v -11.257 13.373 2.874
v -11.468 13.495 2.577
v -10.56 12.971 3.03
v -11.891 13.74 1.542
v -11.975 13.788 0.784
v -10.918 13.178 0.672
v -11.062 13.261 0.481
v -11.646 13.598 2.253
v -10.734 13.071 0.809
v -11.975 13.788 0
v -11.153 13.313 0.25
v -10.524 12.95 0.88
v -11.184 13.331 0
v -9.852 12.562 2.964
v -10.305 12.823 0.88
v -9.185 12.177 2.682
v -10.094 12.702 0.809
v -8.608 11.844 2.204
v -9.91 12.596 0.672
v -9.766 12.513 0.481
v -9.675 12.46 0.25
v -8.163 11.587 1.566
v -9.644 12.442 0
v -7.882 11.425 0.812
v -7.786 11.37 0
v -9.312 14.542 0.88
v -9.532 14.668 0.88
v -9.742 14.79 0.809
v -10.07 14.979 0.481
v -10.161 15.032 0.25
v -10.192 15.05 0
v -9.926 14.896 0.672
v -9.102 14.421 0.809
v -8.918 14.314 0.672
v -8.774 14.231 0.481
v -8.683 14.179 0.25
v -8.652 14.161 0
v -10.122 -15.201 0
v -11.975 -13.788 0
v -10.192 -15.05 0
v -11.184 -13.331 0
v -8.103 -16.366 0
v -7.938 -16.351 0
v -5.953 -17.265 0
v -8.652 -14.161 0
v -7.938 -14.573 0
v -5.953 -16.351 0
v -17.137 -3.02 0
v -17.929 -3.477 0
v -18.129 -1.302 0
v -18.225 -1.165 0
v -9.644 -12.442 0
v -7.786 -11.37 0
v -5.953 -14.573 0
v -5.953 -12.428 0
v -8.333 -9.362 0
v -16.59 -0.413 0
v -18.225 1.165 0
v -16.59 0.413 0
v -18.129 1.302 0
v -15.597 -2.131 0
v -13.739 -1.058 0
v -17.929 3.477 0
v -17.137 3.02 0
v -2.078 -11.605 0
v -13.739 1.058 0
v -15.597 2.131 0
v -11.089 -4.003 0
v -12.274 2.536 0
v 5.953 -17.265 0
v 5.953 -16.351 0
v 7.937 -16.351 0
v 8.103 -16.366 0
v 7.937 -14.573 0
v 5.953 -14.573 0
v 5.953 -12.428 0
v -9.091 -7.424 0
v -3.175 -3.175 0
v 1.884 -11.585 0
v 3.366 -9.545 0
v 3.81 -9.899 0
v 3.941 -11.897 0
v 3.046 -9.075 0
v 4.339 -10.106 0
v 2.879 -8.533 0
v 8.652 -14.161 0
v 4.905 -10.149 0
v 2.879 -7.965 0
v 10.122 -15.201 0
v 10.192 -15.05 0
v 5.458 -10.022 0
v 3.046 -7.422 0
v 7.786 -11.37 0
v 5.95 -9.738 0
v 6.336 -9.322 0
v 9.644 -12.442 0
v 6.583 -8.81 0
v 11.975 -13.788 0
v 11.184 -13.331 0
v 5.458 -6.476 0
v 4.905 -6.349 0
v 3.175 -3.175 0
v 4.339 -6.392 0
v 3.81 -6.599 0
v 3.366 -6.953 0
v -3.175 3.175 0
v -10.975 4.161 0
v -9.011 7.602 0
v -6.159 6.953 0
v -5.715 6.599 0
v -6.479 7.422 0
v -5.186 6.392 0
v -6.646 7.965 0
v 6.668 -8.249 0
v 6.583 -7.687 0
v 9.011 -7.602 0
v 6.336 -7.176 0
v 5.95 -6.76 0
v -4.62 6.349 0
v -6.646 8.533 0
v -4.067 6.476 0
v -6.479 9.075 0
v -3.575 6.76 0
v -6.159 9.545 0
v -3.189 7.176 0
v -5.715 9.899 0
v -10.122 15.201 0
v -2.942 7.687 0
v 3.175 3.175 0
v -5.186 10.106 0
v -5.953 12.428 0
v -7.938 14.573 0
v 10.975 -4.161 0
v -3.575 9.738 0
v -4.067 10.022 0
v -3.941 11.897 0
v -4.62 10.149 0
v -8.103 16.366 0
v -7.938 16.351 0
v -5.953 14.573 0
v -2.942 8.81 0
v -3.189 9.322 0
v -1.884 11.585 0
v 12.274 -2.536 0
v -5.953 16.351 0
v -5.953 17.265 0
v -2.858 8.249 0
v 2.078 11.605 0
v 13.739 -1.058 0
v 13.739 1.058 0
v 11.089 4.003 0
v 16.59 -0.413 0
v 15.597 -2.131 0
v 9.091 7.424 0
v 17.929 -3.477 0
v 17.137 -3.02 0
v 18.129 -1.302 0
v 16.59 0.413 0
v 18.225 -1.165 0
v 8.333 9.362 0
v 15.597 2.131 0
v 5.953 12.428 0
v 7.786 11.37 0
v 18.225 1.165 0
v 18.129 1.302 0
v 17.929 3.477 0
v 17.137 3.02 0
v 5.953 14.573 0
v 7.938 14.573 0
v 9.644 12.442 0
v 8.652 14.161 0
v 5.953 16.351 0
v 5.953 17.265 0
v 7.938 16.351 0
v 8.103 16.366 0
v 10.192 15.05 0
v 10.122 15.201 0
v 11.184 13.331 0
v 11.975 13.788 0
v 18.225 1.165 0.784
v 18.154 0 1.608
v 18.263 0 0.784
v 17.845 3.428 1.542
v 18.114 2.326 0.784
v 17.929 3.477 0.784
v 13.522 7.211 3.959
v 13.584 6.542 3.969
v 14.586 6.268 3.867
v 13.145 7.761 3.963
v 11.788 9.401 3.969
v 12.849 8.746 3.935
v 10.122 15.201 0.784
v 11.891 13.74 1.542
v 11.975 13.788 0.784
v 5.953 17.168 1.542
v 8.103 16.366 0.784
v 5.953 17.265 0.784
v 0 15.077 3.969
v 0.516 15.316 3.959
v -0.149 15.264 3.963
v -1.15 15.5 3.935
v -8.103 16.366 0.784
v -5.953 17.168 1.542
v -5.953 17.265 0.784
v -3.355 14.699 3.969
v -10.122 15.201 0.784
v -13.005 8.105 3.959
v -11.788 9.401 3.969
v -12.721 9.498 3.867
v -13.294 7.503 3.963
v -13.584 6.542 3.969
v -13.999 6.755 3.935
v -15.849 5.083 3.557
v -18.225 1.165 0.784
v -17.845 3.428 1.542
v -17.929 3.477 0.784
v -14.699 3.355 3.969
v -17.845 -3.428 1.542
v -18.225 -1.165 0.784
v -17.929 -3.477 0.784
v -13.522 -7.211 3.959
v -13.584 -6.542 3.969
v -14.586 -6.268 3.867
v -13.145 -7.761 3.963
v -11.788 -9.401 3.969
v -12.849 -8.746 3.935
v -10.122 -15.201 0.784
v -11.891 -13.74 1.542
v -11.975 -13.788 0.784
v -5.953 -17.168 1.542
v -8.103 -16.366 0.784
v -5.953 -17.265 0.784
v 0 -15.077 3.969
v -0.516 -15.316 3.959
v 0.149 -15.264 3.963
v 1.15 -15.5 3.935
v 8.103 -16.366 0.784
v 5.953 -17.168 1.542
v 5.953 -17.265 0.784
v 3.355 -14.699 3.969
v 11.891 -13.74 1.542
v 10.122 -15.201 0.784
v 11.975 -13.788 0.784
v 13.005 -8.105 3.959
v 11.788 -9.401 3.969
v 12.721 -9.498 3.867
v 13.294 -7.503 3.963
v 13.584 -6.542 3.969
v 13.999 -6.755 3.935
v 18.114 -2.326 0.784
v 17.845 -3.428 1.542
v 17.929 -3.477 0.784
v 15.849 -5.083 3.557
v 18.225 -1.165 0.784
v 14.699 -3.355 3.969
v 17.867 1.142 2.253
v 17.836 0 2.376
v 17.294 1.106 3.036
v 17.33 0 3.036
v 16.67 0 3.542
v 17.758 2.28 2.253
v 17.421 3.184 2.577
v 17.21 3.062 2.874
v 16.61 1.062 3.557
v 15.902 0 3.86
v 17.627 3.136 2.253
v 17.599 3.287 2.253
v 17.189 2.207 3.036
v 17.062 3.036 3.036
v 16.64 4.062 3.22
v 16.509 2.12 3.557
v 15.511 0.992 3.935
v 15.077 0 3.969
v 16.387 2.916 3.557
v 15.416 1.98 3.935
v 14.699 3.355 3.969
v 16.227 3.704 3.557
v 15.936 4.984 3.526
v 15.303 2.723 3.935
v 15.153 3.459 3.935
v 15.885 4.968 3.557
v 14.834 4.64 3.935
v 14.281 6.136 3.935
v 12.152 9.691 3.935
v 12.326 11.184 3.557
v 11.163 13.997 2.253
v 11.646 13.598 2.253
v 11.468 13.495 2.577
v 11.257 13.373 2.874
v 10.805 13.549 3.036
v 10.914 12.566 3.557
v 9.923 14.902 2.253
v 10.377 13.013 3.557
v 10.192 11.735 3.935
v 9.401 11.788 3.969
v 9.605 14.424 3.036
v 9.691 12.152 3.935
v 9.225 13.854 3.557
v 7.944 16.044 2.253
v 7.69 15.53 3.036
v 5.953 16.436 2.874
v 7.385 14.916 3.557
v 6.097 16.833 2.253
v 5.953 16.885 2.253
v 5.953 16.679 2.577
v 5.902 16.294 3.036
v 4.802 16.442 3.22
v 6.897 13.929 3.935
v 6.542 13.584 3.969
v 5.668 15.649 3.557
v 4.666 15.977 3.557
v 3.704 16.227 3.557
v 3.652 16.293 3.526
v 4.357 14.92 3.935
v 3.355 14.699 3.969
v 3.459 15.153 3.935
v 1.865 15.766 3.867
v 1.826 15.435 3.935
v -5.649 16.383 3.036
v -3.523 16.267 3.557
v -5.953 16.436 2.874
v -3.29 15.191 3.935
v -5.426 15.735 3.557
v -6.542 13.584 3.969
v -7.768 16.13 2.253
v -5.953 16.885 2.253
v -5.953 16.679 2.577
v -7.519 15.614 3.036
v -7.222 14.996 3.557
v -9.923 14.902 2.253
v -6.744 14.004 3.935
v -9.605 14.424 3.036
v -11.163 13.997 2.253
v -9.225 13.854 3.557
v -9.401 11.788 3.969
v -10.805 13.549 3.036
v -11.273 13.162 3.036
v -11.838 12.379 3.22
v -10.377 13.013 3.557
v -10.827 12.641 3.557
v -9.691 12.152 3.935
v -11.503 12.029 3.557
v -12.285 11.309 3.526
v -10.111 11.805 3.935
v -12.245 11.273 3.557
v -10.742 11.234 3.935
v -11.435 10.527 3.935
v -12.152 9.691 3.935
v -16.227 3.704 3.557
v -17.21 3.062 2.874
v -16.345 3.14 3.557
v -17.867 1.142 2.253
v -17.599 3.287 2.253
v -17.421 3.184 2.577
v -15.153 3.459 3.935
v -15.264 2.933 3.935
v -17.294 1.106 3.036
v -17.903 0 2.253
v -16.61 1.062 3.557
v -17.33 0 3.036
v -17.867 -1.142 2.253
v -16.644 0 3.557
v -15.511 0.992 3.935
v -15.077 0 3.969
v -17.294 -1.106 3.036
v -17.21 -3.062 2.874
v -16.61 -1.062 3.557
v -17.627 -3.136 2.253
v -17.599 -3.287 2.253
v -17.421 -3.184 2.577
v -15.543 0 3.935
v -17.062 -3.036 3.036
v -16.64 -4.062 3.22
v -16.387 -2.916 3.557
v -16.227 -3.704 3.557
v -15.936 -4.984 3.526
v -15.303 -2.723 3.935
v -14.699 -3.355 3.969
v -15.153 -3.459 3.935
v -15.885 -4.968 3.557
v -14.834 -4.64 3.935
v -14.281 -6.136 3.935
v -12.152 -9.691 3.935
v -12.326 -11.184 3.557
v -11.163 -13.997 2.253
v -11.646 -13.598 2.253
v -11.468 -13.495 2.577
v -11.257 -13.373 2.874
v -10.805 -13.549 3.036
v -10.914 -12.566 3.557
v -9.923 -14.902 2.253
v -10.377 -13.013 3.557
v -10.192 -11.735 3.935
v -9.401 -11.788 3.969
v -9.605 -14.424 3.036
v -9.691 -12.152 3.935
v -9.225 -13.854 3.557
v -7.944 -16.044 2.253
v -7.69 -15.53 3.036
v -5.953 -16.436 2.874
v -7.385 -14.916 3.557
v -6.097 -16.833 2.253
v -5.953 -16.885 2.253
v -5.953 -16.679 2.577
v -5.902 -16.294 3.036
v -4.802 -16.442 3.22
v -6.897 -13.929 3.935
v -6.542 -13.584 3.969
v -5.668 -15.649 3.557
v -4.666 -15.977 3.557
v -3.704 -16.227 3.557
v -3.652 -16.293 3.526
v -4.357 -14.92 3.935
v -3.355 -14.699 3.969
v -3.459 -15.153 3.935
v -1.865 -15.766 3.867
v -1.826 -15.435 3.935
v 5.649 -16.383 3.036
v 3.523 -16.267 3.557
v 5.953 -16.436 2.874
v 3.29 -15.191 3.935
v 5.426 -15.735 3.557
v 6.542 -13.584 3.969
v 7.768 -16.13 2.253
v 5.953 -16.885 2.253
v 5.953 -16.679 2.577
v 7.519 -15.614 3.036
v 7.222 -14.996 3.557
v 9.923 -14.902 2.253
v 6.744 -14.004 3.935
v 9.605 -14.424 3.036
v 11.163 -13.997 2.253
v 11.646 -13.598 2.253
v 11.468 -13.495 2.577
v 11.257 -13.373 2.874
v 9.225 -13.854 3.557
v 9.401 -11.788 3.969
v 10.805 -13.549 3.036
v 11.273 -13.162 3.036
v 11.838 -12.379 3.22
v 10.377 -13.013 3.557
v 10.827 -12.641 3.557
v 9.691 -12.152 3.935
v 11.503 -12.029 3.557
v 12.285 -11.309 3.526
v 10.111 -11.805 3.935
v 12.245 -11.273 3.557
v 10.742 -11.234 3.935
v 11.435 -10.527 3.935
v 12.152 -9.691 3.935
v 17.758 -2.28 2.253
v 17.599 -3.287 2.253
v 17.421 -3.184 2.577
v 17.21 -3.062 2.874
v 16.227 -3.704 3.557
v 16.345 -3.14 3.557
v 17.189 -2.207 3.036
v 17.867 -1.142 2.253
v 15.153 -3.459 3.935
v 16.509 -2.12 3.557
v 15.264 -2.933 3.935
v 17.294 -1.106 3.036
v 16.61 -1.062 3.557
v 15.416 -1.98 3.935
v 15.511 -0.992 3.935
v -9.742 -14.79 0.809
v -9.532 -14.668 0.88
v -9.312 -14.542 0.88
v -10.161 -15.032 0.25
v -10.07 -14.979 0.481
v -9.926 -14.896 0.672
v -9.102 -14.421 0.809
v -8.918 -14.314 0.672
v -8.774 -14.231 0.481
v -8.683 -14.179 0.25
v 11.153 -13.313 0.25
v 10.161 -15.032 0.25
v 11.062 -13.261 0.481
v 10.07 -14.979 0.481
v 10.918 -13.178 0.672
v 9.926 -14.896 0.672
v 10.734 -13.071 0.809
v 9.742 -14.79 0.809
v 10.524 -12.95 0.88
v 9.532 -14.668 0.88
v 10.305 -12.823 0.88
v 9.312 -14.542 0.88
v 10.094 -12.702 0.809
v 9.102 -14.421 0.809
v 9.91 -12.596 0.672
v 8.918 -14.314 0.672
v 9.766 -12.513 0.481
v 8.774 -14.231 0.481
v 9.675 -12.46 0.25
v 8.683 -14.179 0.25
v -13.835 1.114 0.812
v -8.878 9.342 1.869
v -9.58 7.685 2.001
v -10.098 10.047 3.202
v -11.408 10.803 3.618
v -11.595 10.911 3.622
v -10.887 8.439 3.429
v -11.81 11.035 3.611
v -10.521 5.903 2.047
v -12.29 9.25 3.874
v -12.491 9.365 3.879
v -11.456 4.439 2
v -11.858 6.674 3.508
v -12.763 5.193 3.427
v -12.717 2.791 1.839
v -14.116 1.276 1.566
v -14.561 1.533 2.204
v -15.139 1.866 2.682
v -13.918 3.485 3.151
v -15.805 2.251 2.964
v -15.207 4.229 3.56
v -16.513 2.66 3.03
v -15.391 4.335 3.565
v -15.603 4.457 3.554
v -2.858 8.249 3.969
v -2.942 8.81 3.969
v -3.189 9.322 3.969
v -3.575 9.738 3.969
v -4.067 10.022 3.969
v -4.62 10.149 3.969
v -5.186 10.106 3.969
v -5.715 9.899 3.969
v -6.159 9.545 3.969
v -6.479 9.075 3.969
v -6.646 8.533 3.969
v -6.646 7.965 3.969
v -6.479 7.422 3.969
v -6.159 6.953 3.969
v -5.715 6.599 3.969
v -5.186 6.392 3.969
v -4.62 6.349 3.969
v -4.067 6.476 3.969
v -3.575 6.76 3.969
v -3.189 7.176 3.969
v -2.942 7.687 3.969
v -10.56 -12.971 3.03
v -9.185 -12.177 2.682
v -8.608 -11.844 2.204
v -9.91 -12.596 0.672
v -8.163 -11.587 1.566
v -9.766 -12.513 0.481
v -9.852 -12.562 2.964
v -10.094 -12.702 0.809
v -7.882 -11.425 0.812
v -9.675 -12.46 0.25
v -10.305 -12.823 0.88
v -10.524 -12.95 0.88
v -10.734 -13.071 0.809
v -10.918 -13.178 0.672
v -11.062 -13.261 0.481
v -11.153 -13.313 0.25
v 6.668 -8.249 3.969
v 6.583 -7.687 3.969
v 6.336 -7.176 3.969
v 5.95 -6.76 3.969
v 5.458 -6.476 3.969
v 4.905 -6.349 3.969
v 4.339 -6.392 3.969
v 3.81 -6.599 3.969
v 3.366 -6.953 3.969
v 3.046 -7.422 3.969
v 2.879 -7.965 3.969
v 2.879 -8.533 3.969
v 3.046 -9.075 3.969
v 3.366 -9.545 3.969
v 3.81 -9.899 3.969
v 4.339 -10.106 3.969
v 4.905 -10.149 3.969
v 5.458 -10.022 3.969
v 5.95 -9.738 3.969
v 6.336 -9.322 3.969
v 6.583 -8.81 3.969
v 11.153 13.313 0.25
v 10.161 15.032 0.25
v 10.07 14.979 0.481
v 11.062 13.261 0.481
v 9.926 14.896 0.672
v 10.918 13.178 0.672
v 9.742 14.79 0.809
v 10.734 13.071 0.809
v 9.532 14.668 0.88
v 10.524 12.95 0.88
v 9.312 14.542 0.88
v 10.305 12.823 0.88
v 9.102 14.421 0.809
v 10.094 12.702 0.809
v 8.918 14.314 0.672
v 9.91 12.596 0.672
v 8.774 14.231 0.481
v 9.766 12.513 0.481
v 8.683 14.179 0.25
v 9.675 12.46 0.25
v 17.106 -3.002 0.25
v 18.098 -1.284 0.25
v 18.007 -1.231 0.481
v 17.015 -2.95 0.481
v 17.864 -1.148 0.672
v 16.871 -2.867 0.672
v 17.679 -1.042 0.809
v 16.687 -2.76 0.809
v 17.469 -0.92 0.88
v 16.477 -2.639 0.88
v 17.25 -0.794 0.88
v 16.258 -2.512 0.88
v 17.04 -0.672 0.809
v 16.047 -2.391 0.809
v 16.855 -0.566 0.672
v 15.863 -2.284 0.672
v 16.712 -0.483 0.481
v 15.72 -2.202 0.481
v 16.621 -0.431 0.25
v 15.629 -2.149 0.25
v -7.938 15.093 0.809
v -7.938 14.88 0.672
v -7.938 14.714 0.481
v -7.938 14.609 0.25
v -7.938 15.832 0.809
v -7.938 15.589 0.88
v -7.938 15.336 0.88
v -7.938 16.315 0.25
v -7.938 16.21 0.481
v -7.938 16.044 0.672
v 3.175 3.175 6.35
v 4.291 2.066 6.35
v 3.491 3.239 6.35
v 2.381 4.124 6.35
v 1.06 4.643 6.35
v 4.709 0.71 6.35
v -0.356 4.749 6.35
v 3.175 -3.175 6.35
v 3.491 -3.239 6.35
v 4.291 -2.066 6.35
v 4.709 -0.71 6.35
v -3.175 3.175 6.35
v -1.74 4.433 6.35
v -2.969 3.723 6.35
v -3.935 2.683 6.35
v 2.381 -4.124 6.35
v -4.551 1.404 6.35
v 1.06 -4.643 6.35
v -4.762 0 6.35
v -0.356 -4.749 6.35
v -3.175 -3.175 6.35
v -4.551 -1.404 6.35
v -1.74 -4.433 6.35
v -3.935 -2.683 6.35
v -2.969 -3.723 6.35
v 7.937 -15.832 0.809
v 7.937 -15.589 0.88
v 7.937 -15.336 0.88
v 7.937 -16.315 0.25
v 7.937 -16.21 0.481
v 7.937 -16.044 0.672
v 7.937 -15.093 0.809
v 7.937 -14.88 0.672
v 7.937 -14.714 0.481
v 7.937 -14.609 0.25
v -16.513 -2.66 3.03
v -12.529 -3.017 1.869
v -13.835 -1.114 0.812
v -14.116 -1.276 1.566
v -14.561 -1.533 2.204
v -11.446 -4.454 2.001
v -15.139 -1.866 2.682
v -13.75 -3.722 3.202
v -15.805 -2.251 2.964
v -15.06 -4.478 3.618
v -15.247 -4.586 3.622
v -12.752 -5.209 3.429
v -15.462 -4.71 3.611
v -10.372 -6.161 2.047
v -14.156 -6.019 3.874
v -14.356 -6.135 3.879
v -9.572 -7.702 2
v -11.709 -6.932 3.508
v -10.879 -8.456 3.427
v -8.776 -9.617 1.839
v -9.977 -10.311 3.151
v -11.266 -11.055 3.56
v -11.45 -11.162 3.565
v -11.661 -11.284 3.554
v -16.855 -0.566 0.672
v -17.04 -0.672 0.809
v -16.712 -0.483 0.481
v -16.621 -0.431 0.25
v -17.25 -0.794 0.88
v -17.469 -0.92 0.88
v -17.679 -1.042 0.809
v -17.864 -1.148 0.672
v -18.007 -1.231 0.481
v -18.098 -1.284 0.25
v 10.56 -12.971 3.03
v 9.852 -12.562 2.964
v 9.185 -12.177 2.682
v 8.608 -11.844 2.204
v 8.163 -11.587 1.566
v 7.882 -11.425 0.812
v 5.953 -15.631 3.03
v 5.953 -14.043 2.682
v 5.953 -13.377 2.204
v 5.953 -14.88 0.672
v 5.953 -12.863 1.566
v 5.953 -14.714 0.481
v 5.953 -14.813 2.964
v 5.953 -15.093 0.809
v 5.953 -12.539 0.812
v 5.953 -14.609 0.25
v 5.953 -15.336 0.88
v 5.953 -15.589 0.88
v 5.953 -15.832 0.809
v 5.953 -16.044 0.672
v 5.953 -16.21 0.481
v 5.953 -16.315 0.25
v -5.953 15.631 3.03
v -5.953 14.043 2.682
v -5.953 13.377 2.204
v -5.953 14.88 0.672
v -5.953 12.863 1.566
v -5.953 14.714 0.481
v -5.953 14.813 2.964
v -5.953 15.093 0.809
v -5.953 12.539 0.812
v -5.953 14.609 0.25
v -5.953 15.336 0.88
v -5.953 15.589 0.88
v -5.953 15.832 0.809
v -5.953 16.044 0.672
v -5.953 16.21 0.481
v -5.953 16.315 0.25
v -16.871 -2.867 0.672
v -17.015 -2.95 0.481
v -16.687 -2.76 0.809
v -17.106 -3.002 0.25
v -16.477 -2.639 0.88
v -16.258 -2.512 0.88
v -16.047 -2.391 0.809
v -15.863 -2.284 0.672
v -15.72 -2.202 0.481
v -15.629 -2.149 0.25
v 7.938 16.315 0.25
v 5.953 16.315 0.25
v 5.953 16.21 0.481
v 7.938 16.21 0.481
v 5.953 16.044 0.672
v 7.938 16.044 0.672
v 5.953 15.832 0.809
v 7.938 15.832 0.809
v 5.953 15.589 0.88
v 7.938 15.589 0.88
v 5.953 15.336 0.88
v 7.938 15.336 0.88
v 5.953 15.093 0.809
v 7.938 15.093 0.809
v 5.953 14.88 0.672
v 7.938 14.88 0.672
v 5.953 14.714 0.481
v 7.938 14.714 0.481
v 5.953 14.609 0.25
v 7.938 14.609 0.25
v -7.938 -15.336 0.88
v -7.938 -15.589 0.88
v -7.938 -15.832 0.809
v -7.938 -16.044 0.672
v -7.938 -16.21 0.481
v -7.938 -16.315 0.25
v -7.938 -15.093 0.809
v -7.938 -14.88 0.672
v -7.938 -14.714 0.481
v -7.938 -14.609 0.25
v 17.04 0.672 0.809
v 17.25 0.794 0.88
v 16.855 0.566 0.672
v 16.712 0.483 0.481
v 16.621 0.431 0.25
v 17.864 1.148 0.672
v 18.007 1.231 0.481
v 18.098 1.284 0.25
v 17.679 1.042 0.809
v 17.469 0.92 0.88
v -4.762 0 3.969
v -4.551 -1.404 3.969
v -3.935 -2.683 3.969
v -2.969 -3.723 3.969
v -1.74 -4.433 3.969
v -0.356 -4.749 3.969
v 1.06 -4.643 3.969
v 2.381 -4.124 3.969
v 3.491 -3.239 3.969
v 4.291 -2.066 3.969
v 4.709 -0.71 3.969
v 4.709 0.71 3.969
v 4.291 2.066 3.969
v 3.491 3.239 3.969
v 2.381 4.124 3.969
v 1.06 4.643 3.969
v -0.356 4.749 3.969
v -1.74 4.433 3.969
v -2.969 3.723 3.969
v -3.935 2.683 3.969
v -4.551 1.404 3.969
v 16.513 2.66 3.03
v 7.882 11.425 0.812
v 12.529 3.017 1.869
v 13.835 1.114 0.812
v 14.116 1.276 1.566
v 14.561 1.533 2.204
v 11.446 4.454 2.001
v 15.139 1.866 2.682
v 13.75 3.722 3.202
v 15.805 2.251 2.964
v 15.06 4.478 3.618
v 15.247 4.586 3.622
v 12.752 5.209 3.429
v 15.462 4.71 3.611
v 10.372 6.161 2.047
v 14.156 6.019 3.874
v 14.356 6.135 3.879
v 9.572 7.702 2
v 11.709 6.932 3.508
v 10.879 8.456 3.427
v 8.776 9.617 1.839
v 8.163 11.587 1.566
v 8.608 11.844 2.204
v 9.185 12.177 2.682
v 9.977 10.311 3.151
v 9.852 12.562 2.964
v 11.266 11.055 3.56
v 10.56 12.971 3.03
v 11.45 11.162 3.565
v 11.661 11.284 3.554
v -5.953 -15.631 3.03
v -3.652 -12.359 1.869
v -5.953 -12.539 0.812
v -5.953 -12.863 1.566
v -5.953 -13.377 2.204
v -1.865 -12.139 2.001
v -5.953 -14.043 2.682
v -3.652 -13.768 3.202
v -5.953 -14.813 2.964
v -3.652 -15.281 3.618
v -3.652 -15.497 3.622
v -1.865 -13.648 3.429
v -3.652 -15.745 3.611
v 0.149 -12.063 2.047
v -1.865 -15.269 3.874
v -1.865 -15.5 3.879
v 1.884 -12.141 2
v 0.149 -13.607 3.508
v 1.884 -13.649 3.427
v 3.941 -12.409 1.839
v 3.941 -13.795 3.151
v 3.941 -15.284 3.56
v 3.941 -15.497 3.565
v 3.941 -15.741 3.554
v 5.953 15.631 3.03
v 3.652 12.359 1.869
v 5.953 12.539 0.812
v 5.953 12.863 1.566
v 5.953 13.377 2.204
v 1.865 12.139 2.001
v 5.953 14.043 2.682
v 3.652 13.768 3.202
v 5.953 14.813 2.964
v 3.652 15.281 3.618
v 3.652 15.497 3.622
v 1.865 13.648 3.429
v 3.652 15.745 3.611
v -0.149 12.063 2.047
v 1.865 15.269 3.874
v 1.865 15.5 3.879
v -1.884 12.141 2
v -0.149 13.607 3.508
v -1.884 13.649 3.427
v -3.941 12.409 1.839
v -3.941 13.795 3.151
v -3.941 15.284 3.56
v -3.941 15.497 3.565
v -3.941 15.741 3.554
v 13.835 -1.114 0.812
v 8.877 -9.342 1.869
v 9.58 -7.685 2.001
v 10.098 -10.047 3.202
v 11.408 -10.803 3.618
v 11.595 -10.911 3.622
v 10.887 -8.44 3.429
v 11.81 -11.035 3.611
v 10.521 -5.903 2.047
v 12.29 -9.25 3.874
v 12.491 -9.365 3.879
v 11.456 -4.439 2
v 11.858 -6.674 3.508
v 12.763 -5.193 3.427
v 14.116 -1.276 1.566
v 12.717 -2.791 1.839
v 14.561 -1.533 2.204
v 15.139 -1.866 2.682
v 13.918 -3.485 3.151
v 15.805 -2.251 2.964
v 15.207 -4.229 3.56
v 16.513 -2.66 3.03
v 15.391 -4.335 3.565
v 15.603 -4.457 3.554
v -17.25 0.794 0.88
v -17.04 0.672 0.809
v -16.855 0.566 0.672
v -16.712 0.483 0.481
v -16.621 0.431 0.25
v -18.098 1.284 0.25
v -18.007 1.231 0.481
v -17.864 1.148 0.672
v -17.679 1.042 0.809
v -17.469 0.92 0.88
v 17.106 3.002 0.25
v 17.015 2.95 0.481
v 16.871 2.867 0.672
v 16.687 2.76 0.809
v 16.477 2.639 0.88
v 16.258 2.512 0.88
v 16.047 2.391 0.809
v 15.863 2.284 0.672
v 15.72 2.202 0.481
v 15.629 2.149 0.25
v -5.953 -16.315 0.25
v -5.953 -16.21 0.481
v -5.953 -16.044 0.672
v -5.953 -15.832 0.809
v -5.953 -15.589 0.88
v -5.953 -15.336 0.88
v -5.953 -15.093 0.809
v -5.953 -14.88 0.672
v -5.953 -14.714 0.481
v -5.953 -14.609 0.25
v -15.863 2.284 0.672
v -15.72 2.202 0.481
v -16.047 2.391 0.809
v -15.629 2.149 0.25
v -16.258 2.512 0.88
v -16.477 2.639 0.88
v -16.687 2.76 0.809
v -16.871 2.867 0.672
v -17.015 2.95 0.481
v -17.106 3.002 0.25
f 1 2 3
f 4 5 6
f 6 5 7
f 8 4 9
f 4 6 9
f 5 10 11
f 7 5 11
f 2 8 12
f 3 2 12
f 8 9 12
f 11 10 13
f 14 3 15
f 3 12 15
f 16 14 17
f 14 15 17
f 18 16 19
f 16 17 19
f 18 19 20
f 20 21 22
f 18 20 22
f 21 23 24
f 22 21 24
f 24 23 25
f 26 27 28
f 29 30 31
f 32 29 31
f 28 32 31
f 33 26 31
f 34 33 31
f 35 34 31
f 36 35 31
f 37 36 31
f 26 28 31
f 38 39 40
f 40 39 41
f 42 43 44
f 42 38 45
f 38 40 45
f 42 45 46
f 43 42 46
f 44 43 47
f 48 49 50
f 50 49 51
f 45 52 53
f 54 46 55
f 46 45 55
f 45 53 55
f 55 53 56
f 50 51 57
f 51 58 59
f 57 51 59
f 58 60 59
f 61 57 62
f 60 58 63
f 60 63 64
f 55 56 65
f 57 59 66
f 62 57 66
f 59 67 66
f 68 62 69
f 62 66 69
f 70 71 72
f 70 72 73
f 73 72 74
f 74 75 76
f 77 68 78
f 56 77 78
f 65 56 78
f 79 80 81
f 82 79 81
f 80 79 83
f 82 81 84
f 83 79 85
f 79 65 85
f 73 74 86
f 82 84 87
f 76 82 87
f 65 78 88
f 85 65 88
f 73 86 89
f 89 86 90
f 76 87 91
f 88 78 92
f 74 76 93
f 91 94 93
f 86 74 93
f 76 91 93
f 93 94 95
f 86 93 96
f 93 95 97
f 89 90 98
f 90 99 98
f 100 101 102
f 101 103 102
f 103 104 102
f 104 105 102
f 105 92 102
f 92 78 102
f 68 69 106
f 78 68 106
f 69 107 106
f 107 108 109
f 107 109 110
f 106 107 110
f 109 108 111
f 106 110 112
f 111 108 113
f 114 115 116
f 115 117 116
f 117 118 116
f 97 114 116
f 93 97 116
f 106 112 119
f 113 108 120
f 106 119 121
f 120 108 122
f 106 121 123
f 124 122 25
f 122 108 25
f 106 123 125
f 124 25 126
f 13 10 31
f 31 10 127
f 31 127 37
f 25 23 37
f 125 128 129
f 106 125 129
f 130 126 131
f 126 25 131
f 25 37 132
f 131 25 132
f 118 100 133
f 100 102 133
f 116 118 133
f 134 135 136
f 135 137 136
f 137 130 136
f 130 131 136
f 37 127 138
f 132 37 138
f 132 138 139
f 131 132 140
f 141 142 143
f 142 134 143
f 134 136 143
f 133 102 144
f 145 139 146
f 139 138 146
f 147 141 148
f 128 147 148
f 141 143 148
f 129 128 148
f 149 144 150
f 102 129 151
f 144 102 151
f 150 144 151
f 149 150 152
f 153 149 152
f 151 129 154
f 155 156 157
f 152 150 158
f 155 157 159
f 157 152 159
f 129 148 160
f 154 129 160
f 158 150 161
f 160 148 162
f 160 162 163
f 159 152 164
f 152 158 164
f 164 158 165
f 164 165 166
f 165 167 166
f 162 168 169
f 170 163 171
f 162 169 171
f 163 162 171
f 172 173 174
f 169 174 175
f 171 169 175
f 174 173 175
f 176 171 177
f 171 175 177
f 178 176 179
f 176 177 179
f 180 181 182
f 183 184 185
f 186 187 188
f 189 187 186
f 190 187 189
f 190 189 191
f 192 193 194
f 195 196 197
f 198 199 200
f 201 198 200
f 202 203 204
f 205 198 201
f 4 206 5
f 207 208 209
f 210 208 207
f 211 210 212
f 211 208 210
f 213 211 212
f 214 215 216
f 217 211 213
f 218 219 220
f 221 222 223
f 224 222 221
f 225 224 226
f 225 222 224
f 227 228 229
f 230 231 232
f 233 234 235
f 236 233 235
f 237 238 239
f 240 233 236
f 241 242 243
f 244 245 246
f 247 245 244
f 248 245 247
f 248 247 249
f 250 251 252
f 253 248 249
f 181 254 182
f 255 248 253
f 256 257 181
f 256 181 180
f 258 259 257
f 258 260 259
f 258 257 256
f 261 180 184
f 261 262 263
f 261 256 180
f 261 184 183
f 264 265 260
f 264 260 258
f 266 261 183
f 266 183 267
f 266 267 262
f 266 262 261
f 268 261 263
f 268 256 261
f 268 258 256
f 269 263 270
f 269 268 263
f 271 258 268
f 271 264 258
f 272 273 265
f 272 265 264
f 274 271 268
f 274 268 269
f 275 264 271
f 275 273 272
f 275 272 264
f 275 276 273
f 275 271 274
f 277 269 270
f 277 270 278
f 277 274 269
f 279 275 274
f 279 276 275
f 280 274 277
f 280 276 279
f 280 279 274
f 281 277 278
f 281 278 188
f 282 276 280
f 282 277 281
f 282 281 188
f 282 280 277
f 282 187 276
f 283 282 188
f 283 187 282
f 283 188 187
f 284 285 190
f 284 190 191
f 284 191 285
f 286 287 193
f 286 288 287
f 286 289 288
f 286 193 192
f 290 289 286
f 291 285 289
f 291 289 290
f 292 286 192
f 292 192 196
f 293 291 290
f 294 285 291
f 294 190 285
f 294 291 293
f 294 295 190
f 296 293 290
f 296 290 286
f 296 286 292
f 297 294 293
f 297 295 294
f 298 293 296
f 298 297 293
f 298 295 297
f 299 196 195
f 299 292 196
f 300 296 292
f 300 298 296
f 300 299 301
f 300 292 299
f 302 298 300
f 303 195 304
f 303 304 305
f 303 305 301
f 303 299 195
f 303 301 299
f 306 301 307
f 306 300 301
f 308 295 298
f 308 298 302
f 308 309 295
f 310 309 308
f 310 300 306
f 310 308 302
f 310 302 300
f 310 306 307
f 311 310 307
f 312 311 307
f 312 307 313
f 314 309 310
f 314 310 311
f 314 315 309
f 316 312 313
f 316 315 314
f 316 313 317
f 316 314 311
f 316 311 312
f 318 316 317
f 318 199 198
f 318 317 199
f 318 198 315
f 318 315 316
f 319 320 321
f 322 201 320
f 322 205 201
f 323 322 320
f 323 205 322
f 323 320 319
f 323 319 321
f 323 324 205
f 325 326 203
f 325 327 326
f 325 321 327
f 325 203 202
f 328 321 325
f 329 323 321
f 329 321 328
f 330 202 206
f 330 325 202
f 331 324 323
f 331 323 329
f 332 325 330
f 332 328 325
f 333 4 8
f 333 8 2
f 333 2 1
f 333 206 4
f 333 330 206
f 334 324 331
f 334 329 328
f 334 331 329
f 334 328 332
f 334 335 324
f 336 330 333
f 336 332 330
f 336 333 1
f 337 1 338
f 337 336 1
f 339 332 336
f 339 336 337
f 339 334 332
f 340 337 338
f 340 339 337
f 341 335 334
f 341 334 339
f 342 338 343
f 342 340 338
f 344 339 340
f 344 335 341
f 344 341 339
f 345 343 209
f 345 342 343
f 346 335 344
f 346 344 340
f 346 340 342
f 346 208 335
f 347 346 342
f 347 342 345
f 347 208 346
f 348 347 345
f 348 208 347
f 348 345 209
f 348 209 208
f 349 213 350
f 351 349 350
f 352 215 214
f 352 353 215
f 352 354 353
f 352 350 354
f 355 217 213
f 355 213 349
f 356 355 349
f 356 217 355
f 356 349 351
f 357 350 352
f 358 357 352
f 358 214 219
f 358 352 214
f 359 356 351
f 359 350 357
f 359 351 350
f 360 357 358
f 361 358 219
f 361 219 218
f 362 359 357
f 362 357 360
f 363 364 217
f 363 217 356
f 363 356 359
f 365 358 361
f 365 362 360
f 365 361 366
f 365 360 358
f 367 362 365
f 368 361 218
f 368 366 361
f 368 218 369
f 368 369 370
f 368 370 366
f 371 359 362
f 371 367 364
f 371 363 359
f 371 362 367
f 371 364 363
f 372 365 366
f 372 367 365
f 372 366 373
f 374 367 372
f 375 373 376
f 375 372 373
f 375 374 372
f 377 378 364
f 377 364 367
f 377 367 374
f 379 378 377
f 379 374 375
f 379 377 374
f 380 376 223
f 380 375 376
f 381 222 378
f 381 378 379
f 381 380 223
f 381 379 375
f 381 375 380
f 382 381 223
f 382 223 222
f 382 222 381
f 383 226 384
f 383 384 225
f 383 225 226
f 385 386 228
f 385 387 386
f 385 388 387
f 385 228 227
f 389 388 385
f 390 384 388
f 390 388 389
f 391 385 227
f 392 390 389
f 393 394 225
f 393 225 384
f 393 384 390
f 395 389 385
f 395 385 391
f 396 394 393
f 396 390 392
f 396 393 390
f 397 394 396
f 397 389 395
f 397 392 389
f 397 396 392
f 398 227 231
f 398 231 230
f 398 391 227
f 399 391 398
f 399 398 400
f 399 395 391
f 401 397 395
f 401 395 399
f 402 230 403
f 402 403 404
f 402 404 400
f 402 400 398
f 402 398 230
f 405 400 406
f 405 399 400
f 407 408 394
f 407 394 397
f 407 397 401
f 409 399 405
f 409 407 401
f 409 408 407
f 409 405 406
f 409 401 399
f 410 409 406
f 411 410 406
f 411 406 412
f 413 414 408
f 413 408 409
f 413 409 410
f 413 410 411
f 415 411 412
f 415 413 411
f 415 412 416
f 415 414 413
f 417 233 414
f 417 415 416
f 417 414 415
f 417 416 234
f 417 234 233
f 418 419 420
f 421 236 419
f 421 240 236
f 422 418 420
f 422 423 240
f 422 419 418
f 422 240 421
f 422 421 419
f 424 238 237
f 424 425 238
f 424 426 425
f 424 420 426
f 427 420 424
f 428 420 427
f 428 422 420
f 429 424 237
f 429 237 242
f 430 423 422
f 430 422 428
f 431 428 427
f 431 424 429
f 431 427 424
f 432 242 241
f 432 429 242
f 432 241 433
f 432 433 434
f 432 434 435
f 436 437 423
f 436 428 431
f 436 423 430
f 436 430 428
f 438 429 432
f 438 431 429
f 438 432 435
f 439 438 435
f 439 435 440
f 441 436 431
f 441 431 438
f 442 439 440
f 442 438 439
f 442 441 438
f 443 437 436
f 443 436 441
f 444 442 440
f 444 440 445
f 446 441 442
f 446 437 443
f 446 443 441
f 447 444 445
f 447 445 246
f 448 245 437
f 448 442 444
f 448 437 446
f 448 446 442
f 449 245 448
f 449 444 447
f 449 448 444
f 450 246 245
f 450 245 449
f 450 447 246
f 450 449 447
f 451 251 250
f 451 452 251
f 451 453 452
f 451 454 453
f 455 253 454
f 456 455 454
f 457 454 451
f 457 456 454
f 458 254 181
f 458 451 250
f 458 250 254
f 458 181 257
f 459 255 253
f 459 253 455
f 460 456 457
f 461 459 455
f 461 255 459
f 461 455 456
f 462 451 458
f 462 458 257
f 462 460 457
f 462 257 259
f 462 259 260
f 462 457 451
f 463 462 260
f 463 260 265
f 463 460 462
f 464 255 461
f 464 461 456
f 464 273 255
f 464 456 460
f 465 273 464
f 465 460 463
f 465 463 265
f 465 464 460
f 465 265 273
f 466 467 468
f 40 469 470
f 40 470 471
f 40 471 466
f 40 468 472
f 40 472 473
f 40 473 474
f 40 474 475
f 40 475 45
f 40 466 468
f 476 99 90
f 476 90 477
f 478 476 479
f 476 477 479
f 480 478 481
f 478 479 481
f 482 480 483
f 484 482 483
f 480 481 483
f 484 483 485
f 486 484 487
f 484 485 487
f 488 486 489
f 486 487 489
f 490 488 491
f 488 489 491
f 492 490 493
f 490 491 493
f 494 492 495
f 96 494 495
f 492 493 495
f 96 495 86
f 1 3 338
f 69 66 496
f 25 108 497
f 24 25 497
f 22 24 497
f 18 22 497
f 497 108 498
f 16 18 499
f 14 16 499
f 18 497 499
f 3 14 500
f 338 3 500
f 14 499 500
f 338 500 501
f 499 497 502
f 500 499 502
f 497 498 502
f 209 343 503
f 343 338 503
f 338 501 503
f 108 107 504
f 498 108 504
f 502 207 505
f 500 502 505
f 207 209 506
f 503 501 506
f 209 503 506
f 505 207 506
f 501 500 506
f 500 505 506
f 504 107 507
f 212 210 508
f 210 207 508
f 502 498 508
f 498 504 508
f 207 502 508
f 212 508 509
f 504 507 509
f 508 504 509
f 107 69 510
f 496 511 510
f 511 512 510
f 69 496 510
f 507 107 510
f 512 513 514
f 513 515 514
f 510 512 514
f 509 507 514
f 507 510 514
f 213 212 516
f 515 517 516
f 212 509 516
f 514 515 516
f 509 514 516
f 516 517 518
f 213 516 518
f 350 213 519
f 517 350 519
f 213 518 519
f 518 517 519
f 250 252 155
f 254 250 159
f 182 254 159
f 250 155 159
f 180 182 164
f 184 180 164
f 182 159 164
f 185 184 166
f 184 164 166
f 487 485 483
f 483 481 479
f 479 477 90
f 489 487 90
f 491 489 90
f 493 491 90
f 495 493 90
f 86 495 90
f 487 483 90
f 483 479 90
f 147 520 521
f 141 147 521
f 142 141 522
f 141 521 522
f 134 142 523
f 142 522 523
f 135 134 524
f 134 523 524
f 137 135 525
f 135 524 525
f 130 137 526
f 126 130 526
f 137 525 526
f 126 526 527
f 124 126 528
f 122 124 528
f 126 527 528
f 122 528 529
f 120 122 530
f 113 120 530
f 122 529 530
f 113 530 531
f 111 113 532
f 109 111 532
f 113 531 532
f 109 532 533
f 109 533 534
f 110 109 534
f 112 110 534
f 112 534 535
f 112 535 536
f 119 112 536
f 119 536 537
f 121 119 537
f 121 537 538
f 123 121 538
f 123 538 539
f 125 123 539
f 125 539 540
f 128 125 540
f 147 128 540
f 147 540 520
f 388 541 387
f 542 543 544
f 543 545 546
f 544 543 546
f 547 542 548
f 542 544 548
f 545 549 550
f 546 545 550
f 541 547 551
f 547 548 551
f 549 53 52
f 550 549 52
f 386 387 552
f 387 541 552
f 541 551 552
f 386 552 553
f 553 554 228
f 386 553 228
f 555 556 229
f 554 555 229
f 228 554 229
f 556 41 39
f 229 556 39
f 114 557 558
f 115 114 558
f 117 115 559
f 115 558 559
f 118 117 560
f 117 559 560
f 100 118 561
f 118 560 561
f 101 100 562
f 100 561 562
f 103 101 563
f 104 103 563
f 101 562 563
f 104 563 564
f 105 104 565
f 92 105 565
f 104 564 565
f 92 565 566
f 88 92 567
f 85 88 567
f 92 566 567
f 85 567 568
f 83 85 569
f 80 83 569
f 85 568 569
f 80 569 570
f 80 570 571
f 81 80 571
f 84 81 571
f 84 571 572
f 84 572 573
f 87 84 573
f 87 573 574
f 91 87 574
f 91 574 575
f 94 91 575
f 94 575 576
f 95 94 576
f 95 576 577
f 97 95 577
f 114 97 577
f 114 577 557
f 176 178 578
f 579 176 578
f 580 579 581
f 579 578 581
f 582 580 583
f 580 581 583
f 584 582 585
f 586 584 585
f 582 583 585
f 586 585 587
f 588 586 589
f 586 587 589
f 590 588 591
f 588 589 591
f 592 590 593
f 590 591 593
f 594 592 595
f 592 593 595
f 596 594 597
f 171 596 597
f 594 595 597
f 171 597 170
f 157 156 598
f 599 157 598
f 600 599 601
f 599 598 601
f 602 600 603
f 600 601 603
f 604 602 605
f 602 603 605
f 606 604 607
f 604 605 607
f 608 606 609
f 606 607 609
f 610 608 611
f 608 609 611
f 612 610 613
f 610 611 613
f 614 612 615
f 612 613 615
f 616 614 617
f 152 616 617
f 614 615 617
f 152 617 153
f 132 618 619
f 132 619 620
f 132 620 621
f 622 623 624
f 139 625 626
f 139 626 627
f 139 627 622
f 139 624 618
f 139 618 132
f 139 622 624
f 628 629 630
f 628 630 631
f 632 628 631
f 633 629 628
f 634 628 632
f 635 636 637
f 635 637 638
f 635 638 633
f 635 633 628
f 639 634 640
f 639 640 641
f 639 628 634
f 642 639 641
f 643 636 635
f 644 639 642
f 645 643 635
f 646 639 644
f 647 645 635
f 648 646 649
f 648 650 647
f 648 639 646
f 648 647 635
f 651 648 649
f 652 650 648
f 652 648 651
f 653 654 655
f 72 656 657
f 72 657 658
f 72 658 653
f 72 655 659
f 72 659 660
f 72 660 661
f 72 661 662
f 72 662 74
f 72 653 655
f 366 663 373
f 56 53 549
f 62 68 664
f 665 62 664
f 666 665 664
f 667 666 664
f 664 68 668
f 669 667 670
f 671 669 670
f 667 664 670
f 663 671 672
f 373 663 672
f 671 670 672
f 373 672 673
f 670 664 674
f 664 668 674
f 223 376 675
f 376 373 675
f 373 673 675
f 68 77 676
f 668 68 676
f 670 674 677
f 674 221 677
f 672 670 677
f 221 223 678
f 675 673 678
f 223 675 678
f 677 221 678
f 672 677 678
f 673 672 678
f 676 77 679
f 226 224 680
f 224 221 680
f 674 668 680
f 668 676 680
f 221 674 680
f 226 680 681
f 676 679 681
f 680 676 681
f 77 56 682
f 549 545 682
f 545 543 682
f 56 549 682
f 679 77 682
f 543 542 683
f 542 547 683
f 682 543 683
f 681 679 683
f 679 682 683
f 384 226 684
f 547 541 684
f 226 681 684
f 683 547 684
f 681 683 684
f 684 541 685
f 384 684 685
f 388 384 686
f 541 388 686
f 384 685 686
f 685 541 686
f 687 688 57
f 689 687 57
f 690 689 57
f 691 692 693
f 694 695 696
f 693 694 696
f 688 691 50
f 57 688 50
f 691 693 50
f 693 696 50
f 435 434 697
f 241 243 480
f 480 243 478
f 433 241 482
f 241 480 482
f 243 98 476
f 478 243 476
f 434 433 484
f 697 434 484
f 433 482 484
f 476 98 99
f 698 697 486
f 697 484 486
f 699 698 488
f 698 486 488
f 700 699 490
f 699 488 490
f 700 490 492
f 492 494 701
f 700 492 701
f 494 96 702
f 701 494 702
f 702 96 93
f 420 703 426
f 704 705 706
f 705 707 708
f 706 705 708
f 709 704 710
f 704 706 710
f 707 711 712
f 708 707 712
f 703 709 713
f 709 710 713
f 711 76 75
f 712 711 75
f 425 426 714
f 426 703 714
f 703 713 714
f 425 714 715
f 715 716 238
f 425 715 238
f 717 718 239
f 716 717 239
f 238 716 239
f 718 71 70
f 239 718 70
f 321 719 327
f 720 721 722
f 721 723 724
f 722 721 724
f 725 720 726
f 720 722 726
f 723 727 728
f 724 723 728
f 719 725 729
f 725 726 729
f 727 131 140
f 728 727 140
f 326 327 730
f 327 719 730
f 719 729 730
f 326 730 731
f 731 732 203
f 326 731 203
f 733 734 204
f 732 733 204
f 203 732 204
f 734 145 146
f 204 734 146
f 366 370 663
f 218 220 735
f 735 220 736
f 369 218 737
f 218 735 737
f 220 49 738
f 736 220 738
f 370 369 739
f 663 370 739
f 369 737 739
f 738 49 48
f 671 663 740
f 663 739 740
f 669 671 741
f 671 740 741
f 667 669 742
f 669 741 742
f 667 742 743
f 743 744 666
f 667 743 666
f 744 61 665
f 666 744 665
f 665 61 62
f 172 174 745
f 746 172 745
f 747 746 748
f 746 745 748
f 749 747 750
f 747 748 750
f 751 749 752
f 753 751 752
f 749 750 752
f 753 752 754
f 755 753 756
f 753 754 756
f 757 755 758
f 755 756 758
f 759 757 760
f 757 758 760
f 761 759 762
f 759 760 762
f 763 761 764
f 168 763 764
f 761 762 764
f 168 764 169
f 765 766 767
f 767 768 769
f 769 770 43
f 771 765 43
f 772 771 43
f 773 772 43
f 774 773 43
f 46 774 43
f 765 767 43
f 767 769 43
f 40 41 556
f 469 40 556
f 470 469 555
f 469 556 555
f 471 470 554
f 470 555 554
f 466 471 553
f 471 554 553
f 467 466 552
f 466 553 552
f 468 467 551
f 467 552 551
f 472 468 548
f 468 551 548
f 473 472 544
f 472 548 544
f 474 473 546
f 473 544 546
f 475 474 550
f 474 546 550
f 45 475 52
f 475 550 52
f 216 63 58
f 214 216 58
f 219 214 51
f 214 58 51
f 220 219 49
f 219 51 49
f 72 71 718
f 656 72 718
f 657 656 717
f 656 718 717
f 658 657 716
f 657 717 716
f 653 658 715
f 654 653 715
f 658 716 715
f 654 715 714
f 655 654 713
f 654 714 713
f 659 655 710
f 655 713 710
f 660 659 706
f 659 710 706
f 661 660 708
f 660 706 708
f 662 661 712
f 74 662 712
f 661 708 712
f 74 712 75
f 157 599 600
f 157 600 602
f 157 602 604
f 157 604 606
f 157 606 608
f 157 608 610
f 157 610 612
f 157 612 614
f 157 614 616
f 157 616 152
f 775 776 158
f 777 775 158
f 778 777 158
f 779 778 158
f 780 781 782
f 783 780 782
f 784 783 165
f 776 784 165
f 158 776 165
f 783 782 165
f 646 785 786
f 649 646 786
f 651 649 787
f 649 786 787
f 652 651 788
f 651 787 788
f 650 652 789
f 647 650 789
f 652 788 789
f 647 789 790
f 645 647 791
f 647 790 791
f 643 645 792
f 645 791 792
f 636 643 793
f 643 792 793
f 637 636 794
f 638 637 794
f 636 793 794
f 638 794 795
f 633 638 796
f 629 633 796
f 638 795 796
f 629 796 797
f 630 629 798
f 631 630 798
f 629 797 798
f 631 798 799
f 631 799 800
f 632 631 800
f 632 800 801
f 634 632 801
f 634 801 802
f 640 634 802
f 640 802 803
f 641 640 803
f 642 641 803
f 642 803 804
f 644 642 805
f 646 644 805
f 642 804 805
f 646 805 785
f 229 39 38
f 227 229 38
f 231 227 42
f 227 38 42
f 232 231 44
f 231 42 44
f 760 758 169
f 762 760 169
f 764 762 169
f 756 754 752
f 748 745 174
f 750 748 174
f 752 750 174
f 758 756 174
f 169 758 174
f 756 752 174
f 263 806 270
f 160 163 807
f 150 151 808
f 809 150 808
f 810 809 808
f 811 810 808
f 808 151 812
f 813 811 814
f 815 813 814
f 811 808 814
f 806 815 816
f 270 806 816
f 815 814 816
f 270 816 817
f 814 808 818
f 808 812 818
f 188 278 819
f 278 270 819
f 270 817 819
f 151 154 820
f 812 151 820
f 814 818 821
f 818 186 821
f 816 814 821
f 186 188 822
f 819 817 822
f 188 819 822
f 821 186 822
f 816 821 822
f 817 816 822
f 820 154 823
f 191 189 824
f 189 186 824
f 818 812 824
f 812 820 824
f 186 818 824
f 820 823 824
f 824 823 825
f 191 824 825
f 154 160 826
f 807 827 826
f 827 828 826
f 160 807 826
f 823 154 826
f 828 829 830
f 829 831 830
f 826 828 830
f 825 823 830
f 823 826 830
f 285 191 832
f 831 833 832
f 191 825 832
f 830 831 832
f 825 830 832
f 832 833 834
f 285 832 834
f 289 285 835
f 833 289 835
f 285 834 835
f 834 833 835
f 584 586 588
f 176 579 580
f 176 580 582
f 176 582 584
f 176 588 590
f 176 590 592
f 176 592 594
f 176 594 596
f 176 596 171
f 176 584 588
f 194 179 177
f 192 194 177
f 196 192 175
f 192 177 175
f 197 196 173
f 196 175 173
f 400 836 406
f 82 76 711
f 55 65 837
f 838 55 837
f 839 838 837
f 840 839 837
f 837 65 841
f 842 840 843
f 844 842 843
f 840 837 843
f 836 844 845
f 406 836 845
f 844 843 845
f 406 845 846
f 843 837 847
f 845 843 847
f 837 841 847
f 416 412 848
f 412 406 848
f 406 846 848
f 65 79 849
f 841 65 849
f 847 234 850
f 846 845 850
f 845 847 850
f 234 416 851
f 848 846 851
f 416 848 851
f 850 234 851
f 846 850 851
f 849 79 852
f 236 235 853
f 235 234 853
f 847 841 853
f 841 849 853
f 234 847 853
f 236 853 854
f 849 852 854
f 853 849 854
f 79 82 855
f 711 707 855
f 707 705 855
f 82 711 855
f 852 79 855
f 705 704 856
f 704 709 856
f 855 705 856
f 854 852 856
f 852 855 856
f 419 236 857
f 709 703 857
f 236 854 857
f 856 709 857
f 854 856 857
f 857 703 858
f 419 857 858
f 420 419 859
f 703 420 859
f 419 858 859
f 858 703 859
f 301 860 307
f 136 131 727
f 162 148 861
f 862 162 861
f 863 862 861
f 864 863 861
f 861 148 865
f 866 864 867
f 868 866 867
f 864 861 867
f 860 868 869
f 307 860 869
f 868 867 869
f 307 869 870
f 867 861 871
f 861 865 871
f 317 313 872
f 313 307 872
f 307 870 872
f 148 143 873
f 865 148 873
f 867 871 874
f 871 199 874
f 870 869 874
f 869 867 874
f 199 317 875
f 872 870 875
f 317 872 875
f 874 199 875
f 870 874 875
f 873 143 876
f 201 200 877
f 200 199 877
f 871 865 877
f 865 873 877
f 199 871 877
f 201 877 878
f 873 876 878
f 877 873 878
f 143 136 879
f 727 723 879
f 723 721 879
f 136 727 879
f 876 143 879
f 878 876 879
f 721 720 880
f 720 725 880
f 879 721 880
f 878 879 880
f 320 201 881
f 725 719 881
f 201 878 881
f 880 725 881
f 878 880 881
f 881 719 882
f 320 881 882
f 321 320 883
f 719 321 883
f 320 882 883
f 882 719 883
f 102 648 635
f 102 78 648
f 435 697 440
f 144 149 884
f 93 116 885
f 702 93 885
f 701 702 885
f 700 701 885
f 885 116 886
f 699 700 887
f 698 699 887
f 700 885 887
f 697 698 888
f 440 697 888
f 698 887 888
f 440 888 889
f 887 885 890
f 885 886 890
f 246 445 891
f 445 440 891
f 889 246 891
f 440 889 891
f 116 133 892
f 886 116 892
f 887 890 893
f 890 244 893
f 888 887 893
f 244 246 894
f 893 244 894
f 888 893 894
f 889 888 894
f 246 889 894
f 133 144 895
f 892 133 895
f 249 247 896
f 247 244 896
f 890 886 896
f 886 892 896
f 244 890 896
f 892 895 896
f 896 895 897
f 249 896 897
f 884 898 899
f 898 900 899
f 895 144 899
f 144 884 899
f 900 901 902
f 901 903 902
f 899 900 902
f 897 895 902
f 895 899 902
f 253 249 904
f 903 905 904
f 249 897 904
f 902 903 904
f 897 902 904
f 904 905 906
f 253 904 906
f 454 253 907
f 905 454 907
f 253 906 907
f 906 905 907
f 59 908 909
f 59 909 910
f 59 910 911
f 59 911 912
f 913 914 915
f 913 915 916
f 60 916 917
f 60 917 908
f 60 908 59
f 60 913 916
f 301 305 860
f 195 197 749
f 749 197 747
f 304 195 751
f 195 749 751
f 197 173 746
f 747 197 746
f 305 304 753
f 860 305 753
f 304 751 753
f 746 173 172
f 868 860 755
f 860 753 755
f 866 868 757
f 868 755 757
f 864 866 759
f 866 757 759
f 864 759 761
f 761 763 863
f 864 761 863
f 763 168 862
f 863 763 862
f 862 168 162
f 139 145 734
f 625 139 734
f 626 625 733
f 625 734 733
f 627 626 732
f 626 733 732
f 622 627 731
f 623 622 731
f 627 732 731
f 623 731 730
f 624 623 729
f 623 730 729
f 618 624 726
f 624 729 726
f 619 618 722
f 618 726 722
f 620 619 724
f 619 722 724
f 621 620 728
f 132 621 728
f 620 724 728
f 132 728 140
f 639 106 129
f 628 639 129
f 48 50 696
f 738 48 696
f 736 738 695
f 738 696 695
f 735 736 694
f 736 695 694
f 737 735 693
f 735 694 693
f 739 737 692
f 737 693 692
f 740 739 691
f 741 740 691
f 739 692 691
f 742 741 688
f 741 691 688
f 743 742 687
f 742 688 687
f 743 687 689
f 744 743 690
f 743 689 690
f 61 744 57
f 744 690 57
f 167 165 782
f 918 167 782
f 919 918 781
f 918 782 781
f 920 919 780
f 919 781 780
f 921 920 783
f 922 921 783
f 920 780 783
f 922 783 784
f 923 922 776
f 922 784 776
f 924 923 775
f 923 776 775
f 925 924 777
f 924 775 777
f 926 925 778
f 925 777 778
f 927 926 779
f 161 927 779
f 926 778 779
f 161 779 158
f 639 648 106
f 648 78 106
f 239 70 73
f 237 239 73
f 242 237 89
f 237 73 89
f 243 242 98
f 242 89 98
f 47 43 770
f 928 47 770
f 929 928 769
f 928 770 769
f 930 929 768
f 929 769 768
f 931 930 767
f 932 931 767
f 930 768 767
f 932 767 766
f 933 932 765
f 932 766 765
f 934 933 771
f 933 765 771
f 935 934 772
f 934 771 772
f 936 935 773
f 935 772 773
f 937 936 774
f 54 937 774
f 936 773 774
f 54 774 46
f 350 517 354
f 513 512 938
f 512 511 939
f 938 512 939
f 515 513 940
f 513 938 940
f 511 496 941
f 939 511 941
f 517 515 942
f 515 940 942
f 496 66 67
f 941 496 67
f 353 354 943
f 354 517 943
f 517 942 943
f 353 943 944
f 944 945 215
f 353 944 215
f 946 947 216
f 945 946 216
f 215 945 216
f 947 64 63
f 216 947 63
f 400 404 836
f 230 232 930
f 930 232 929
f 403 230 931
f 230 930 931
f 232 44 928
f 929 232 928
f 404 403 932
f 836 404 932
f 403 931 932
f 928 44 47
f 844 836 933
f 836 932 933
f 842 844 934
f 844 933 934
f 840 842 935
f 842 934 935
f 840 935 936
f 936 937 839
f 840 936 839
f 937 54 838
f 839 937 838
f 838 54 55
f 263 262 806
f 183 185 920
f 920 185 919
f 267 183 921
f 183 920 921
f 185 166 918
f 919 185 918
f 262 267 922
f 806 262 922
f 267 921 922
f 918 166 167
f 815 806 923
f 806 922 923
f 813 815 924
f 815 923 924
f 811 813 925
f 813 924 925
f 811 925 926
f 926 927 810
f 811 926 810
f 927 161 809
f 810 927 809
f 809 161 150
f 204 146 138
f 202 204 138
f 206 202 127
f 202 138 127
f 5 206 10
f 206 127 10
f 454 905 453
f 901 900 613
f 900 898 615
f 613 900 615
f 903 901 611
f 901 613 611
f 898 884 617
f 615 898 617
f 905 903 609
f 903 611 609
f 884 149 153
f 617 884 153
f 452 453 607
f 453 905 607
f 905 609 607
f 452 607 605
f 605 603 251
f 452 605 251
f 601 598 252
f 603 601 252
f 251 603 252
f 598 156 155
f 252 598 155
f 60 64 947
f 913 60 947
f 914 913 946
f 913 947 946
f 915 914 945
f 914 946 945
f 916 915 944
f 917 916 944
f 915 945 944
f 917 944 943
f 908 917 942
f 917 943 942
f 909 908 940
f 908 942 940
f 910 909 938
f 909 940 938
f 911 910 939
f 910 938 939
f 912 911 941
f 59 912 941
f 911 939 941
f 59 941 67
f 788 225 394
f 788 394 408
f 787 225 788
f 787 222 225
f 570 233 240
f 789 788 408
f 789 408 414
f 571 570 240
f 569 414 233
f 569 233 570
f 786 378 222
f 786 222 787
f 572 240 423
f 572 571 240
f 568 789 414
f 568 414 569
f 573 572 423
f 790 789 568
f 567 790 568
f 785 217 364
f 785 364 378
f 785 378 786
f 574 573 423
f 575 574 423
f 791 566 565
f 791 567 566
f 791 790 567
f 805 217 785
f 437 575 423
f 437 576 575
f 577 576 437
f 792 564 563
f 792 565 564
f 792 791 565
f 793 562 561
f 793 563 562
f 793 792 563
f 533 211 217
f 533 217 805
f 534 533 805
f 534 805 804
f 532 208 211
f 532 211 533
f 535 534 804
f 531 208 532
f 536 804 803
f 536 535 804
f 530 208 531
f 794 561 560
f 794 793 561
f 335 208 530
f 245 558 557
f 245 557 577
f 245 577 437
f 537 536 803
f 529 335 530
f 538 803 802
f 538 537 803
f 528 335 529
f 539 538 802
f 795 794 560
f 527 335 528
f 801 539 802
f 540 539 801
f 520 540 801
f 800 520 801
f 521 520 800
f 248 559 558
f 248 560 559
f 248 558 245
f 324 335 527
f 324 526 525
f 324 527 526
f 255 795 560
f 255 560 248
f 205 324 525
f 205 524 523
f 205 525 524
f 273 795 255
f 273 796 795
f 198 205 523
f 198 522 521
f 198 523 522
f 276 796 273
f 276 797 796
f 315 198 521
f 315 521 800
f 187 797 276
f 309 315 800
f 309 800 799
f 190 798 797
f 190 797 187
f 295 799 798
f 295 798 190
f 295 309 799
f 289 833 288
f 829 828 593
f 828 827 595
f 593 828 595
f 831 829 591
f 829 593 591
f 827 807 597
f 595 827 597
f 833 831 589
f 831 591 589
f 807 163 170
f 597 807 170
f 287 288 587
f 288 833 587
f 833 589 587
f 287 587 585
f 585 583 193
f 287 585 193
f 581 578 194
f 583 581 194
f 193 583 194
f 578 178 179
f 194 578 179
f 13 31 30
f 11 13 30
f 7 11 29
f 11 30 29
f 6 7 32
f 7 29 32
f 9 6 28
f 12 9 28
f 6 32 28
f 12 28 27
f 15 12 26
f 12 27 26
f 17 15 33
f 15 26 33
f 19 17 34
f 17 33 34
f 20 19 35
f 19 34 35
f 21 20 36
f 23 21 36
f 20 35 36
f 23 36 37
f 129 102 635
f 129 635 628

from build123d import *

# Parameters (mm, degrees)
SKETCH1_R           = 18.2626
BOSS_EXTRUDE1_DEPTH = 3.96875
FILLET1_R           = 3.18516
SKETCH2_R           = 1.905
SKETCH2_W           = 6.35
SKETCH2_H           = 6.35
CUT_EXTRUDE1_DEPTH  = 27.130367418
SKETCH6_R           = 0.889
CUT_EXTRUDE2_DEPTH  = 7.9375
CIRPATTERN1_COUNT   = 6
SKETCH7_R           = 4.7625
SKETCH7_W           = 6.35
SKETCH7_H           = 6.35
BOSS_EXTRUDE2_DEPTH = 2.38125


with BuildPart() as part:
    # Sketch1 → Boss-Extrude1 (new body)
    with BuildSketch(Plane.XY):
        Circle(SKETCH1_R)
    extrude(amount=BOSS_EXTRUDE1_DEPTH)

    # Fillet1
    fillet1_edges = [part.edges().sort_by_distance(p)[0] for p in [
        (-18.2626, 0, 3.96875),
    ]]
    fillet(fillet1_edges, radius=FILLET1_R)

    # Sketch2 → Cut-Extrude1 (cut, through all)
    with BuildSketch(Plane.XY.offset(3.96875)):
        with Locations((-4.7625, 8.248891971)):
            Circle(SKETCH2_R)
        with Locations((4.7625, -8.248891971)):
            Circle(SKETCH2_R)
        Rectangle(SKETCH2_W, SKETCH2_H)
    extrude(amount=-CUT_EXTRUDE1_DEPTH, mode=Mode.SUBTRACT)

    # Sketch5 → Cut-Revolve1 (revolve, cut)
    with BuildSketch(Plane.XY):
        with BuildLine():
            Line((-5.953125, 15.46225), (5.953125, 15.46225))
            Line((5.953125, 15.46225), (5.953125, 18.496596004))
            ThreePointArc((5.953125, 18.496596004), (0, 19.431), (-5.953125, 18.496596004))
            Line((-5.953125, 18.496596004), (-5.953125, 15.46225))
        make_face()
    cut_revolve1 = revolve(axis=Axis((-5.953125, 15.46225, 0), (-1, 0, 0)), mode=Mode.SUBTRACT)

    # Sketch6 → Cut-Extrude2 (cut, symmetric)
    with BuildSketch(Plane(origin=(0, 0, 0), x_dir=(0, 0, -1), z_dir=(1, 0, 0))):
        with Locations((0, 15.46225)):
            Circle(SKETCH6_R)
    cut_extrude2 = extrude(amount=CUT_EXTRUDE2_DEPTH, both=True, mode=Mode.SUBTRACT)

    # CirPattern1: Cut-Revolve1, Cut-Extrude2 ×6 about axis
    cirpattern1_axis = Axis((0, 0, 0), (0, 0, 1))
    add([cut_revolve1.rotate(cirpattern1_axis, i * 360 / CIRPATTERN1_COUNT) for i in range(1, CIRPATTERN1_COUNT)], mode=Mode.SUBTRACT)
    add([cut_extrude2.rotate(cirpattern1_axis, i * 360 / CIRPATTERN1_COUNT) for i in range(1, CIRPATTERN1_COUNT)], mode=Mode.SUBTRACT)

    # Sketch7 → Boss-Extrude2 (add)
    with BuildSketch(Plane.XY.offset(3.96875)):
        with Locations(Location((0, 0, 0), (0, 0, 180))):
            Circle(SKETCH7_R)
        Rectangle(SKETCH7_W, SKETCH7_H, mode=Mode.SUBTRACT)
    extrude(amount=BOSS_EXTRUDE2_DEPTH)


solid = part.part
